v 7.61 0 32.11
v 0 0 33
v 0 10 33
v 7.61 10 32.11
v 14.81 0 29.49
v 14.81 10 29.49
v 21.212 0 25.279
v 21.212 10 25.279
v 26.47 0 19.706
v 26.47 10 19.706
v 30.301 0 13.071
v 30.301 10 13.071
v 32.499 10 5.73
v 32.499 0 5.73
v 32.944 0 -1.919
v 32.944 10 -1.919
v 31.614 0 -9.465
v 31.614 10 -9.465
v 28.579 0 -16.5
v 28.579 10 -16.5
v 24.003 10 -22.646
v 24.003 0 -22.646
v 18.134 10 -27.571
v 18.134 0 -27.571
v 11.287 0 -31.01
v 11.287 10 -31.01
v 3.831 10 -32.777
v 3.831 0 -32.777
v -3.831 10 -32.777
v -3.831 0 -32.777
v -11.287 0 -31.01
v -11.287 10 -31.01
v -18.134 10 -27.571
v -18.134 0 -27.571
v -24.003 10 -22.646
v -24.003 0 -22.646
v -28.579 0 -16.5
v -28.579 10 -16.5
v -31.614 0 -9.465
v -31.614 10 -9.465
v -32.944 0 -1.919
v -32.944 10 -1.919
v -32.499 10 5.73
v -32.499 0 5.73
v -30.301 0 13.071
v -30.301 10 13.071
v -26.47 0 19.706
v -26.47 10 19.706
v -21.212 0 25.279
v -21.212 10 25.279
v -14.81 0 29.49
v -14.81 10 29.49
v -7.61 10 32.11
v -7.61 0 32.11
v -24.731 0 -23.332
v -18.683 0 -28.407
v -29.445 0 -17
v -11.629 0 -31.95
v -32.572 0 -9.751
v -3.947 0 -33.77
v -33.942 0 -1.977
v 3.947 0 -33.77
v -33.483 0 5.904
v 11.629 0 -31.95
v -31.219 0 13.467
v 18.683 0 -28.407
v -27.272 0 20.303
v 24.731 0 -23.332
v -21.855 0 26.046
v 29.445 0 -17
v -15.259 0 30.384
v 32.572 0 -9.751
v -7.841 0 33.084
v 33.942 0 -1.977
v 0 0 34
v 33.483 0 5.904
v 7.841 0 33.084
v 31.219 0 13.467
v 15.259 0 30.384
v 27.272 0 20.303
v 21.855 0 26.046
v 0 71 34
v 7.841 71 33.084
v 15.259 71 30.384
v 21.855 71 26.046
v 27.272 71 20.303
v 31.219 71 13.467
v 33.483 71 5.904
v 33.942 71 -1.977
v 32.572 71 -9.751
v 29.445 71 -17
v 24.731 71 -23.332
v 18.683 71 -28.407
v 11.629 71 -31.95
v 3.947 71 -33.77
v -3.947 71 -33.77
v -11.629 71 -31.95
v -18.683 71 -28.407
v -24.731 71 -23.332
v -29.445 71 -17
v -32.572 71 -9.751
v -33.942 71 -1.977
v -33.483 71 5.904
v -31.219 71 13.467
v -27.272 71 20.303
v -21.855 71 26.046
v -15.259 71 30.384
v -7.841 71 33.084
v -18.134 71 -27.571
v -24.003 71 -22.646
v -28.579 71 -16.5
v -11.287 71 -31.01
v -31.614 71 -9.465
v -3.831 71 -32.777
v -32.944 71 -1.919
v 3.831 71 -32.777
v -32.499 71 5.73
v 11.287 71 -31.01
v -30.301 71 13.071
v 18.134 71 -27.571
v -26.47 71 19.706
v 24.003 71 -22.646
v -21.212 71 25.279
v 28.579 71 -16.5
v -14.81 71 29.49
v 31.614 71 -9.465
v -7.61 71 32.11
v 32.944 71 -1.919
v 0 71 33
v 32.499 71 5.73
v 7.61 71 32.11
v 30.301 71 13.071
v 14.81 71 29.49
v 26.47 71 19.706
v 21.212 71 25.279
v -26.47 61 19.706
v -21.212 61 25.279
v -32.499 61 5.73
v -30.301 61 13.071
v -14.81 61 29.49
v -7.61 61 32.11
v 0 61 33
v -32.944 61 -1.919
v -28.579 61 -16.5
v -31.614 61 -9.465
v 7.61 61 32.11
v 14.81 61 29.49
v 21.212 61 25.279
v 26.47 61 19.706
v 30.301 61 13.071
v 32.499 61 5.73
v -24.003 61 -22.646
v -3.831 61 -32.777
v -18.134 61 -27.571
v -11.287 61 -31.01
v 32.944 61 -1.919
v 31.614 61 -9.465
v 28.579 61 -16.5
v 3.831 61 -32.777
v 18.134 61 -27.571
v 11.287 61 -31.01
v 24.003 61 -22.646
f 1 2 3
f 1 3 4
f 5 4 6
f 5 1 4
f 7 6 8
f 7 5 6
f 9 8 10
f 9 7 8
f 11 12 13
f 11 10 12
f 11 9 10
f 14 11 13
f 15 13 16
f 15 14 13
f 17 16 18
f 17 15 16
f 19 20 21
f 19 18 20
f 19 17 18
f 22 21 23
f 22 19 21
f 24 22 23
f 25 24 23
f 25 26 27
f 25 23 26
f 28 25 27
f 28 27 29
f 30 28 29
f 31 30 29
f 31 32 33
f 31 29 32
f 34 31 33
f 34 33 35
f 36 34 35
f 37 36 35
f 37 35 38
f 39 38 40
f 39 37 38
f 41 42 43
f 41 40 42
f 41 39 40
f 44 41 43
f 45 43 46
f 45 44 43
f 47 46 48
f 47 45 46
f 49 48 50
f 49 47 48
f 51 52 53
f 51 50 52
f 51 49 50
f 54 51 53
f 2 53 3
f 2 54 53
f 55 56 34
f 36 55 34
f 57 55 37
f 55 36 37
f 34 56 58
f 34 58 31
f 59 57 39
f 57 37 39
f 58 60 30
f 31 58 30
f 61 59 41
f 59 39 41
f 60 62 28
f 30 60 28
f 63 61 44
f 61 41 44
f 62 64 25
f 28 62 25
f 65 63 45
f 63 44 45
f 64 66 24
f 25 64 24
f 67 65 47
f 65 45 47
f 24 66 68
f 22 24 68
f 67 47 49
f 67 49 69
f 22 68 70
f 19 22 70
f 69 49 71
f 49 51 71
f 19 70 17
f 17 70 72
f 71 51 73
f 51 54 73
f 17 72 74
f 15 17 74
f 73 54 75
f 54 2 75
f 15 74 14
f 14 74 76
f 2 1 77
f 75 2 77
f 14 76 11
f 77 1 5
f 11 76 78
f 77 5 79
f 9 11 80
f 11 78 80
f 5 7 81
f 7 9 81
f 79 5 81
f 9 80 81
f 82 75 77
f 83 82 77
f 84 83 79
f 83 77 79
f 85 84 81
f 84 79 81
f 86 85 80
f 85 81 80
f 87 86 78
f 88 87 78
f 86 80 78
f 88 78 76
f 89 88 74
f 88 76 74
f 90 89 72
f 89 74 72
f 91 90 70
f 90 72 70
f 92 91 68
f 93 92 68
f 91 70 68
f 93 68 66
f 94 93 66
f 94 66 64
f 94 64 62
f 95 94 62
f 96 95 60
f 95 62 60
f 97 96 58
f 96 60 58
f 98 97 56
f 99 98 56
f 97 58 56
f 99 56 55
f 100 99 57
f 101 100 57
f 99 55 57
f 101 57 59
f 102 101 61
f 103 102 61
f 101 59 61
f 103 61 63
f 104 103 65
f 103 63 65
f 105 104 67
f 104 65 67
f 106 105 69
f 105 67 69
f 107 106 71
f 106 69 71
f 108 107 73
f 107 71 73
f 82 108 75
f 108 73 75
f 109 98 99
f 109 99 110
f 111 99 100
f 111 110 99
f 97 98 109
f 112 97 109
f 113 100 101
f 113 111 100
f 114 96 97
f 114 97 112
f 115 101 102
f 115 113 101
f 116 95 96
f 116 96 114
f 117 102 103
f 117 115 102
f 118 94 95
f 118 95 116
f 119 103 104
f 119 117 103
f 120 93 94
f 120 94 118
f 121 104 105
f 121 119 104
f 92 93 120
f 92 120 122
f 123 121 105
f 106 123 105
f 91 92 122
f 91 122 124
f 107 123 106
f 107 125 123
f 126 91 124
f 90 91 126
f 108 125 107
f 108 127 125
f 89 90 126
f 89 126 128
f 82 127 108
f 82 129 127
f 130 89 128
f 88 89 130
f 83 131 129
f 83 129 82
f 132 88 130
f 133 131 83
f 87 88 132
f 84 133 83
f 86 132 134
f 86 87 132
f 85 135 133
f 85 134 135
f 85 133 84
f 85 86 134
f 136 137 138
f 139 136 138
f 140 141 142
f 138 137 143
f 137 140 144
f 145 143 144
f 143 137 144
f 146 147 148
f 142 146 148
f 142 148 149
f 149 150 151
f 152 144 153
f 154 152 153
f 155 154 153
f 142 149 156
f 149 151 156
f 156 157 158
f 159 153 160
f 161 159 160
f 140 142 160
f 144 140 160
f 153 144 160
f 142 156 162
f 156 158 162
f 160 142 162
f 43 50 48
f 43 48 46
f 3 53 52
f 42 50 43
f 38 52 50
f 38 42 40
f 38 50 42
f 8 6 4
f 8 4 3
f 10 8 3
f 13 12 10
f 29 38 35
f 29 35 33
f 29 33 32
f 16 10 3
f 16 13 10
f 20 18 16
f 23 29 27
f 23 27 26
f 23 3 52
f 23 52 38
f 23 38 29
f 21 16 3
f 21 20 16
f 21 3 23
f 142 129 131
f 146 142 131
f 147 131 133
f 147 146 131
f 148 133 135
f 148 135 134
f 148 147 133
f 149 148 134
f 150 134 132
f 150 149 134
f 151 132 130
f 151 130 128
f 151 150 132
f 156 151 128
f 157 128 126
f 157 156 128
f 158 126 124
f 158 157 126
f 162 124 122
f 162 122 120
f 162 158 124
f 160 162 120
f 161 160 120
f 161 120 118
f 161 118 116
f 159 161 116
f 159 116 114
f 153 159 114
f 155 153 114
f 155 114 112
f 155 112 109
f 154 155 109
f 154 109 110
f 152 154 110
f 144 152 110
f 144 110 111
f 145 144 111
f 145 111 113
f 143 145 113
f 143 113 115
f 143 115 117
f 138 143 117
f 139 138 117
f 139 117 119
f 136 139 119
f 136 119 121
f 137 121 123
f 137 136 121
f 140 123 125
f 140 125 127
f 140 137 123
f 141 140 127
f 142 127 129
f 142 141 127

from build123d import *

# Parameters (mm, degrees)
SKETCH1_R           = 34
SKETCH1_R_2         = 33
BOSS_EXTRUDE1_DEPTH = 71
SKETCH2_W           = 33
SKETCH2_H           = 51


with BuildPart() as part:
    # Sketch1 → Boss-Extrude1 (new body)
    with BuildSketch(Plane(origin=(0, 0, 0), x_dir=(1, 0, 0), z_dir=(0, 1, 0))):
        Circle(SKETCH1_R)
        Circle(SKETCH1_R_2, mode=Mode.SUBTRACT)
    extrude(amount=BOSS_EXTRUDE1_DEPTH)

    # Sketch2 → Revolve1 (revolve)
    with BuildSketch(Plane.XY):
        with Locations((-16.5, 35.5)):
            Rectangle(SKETCH2_W, SKETCH2_H)
    revolve(axis=Axis((0, 61, 0), (0, -1, 0)))


solid = part.part
